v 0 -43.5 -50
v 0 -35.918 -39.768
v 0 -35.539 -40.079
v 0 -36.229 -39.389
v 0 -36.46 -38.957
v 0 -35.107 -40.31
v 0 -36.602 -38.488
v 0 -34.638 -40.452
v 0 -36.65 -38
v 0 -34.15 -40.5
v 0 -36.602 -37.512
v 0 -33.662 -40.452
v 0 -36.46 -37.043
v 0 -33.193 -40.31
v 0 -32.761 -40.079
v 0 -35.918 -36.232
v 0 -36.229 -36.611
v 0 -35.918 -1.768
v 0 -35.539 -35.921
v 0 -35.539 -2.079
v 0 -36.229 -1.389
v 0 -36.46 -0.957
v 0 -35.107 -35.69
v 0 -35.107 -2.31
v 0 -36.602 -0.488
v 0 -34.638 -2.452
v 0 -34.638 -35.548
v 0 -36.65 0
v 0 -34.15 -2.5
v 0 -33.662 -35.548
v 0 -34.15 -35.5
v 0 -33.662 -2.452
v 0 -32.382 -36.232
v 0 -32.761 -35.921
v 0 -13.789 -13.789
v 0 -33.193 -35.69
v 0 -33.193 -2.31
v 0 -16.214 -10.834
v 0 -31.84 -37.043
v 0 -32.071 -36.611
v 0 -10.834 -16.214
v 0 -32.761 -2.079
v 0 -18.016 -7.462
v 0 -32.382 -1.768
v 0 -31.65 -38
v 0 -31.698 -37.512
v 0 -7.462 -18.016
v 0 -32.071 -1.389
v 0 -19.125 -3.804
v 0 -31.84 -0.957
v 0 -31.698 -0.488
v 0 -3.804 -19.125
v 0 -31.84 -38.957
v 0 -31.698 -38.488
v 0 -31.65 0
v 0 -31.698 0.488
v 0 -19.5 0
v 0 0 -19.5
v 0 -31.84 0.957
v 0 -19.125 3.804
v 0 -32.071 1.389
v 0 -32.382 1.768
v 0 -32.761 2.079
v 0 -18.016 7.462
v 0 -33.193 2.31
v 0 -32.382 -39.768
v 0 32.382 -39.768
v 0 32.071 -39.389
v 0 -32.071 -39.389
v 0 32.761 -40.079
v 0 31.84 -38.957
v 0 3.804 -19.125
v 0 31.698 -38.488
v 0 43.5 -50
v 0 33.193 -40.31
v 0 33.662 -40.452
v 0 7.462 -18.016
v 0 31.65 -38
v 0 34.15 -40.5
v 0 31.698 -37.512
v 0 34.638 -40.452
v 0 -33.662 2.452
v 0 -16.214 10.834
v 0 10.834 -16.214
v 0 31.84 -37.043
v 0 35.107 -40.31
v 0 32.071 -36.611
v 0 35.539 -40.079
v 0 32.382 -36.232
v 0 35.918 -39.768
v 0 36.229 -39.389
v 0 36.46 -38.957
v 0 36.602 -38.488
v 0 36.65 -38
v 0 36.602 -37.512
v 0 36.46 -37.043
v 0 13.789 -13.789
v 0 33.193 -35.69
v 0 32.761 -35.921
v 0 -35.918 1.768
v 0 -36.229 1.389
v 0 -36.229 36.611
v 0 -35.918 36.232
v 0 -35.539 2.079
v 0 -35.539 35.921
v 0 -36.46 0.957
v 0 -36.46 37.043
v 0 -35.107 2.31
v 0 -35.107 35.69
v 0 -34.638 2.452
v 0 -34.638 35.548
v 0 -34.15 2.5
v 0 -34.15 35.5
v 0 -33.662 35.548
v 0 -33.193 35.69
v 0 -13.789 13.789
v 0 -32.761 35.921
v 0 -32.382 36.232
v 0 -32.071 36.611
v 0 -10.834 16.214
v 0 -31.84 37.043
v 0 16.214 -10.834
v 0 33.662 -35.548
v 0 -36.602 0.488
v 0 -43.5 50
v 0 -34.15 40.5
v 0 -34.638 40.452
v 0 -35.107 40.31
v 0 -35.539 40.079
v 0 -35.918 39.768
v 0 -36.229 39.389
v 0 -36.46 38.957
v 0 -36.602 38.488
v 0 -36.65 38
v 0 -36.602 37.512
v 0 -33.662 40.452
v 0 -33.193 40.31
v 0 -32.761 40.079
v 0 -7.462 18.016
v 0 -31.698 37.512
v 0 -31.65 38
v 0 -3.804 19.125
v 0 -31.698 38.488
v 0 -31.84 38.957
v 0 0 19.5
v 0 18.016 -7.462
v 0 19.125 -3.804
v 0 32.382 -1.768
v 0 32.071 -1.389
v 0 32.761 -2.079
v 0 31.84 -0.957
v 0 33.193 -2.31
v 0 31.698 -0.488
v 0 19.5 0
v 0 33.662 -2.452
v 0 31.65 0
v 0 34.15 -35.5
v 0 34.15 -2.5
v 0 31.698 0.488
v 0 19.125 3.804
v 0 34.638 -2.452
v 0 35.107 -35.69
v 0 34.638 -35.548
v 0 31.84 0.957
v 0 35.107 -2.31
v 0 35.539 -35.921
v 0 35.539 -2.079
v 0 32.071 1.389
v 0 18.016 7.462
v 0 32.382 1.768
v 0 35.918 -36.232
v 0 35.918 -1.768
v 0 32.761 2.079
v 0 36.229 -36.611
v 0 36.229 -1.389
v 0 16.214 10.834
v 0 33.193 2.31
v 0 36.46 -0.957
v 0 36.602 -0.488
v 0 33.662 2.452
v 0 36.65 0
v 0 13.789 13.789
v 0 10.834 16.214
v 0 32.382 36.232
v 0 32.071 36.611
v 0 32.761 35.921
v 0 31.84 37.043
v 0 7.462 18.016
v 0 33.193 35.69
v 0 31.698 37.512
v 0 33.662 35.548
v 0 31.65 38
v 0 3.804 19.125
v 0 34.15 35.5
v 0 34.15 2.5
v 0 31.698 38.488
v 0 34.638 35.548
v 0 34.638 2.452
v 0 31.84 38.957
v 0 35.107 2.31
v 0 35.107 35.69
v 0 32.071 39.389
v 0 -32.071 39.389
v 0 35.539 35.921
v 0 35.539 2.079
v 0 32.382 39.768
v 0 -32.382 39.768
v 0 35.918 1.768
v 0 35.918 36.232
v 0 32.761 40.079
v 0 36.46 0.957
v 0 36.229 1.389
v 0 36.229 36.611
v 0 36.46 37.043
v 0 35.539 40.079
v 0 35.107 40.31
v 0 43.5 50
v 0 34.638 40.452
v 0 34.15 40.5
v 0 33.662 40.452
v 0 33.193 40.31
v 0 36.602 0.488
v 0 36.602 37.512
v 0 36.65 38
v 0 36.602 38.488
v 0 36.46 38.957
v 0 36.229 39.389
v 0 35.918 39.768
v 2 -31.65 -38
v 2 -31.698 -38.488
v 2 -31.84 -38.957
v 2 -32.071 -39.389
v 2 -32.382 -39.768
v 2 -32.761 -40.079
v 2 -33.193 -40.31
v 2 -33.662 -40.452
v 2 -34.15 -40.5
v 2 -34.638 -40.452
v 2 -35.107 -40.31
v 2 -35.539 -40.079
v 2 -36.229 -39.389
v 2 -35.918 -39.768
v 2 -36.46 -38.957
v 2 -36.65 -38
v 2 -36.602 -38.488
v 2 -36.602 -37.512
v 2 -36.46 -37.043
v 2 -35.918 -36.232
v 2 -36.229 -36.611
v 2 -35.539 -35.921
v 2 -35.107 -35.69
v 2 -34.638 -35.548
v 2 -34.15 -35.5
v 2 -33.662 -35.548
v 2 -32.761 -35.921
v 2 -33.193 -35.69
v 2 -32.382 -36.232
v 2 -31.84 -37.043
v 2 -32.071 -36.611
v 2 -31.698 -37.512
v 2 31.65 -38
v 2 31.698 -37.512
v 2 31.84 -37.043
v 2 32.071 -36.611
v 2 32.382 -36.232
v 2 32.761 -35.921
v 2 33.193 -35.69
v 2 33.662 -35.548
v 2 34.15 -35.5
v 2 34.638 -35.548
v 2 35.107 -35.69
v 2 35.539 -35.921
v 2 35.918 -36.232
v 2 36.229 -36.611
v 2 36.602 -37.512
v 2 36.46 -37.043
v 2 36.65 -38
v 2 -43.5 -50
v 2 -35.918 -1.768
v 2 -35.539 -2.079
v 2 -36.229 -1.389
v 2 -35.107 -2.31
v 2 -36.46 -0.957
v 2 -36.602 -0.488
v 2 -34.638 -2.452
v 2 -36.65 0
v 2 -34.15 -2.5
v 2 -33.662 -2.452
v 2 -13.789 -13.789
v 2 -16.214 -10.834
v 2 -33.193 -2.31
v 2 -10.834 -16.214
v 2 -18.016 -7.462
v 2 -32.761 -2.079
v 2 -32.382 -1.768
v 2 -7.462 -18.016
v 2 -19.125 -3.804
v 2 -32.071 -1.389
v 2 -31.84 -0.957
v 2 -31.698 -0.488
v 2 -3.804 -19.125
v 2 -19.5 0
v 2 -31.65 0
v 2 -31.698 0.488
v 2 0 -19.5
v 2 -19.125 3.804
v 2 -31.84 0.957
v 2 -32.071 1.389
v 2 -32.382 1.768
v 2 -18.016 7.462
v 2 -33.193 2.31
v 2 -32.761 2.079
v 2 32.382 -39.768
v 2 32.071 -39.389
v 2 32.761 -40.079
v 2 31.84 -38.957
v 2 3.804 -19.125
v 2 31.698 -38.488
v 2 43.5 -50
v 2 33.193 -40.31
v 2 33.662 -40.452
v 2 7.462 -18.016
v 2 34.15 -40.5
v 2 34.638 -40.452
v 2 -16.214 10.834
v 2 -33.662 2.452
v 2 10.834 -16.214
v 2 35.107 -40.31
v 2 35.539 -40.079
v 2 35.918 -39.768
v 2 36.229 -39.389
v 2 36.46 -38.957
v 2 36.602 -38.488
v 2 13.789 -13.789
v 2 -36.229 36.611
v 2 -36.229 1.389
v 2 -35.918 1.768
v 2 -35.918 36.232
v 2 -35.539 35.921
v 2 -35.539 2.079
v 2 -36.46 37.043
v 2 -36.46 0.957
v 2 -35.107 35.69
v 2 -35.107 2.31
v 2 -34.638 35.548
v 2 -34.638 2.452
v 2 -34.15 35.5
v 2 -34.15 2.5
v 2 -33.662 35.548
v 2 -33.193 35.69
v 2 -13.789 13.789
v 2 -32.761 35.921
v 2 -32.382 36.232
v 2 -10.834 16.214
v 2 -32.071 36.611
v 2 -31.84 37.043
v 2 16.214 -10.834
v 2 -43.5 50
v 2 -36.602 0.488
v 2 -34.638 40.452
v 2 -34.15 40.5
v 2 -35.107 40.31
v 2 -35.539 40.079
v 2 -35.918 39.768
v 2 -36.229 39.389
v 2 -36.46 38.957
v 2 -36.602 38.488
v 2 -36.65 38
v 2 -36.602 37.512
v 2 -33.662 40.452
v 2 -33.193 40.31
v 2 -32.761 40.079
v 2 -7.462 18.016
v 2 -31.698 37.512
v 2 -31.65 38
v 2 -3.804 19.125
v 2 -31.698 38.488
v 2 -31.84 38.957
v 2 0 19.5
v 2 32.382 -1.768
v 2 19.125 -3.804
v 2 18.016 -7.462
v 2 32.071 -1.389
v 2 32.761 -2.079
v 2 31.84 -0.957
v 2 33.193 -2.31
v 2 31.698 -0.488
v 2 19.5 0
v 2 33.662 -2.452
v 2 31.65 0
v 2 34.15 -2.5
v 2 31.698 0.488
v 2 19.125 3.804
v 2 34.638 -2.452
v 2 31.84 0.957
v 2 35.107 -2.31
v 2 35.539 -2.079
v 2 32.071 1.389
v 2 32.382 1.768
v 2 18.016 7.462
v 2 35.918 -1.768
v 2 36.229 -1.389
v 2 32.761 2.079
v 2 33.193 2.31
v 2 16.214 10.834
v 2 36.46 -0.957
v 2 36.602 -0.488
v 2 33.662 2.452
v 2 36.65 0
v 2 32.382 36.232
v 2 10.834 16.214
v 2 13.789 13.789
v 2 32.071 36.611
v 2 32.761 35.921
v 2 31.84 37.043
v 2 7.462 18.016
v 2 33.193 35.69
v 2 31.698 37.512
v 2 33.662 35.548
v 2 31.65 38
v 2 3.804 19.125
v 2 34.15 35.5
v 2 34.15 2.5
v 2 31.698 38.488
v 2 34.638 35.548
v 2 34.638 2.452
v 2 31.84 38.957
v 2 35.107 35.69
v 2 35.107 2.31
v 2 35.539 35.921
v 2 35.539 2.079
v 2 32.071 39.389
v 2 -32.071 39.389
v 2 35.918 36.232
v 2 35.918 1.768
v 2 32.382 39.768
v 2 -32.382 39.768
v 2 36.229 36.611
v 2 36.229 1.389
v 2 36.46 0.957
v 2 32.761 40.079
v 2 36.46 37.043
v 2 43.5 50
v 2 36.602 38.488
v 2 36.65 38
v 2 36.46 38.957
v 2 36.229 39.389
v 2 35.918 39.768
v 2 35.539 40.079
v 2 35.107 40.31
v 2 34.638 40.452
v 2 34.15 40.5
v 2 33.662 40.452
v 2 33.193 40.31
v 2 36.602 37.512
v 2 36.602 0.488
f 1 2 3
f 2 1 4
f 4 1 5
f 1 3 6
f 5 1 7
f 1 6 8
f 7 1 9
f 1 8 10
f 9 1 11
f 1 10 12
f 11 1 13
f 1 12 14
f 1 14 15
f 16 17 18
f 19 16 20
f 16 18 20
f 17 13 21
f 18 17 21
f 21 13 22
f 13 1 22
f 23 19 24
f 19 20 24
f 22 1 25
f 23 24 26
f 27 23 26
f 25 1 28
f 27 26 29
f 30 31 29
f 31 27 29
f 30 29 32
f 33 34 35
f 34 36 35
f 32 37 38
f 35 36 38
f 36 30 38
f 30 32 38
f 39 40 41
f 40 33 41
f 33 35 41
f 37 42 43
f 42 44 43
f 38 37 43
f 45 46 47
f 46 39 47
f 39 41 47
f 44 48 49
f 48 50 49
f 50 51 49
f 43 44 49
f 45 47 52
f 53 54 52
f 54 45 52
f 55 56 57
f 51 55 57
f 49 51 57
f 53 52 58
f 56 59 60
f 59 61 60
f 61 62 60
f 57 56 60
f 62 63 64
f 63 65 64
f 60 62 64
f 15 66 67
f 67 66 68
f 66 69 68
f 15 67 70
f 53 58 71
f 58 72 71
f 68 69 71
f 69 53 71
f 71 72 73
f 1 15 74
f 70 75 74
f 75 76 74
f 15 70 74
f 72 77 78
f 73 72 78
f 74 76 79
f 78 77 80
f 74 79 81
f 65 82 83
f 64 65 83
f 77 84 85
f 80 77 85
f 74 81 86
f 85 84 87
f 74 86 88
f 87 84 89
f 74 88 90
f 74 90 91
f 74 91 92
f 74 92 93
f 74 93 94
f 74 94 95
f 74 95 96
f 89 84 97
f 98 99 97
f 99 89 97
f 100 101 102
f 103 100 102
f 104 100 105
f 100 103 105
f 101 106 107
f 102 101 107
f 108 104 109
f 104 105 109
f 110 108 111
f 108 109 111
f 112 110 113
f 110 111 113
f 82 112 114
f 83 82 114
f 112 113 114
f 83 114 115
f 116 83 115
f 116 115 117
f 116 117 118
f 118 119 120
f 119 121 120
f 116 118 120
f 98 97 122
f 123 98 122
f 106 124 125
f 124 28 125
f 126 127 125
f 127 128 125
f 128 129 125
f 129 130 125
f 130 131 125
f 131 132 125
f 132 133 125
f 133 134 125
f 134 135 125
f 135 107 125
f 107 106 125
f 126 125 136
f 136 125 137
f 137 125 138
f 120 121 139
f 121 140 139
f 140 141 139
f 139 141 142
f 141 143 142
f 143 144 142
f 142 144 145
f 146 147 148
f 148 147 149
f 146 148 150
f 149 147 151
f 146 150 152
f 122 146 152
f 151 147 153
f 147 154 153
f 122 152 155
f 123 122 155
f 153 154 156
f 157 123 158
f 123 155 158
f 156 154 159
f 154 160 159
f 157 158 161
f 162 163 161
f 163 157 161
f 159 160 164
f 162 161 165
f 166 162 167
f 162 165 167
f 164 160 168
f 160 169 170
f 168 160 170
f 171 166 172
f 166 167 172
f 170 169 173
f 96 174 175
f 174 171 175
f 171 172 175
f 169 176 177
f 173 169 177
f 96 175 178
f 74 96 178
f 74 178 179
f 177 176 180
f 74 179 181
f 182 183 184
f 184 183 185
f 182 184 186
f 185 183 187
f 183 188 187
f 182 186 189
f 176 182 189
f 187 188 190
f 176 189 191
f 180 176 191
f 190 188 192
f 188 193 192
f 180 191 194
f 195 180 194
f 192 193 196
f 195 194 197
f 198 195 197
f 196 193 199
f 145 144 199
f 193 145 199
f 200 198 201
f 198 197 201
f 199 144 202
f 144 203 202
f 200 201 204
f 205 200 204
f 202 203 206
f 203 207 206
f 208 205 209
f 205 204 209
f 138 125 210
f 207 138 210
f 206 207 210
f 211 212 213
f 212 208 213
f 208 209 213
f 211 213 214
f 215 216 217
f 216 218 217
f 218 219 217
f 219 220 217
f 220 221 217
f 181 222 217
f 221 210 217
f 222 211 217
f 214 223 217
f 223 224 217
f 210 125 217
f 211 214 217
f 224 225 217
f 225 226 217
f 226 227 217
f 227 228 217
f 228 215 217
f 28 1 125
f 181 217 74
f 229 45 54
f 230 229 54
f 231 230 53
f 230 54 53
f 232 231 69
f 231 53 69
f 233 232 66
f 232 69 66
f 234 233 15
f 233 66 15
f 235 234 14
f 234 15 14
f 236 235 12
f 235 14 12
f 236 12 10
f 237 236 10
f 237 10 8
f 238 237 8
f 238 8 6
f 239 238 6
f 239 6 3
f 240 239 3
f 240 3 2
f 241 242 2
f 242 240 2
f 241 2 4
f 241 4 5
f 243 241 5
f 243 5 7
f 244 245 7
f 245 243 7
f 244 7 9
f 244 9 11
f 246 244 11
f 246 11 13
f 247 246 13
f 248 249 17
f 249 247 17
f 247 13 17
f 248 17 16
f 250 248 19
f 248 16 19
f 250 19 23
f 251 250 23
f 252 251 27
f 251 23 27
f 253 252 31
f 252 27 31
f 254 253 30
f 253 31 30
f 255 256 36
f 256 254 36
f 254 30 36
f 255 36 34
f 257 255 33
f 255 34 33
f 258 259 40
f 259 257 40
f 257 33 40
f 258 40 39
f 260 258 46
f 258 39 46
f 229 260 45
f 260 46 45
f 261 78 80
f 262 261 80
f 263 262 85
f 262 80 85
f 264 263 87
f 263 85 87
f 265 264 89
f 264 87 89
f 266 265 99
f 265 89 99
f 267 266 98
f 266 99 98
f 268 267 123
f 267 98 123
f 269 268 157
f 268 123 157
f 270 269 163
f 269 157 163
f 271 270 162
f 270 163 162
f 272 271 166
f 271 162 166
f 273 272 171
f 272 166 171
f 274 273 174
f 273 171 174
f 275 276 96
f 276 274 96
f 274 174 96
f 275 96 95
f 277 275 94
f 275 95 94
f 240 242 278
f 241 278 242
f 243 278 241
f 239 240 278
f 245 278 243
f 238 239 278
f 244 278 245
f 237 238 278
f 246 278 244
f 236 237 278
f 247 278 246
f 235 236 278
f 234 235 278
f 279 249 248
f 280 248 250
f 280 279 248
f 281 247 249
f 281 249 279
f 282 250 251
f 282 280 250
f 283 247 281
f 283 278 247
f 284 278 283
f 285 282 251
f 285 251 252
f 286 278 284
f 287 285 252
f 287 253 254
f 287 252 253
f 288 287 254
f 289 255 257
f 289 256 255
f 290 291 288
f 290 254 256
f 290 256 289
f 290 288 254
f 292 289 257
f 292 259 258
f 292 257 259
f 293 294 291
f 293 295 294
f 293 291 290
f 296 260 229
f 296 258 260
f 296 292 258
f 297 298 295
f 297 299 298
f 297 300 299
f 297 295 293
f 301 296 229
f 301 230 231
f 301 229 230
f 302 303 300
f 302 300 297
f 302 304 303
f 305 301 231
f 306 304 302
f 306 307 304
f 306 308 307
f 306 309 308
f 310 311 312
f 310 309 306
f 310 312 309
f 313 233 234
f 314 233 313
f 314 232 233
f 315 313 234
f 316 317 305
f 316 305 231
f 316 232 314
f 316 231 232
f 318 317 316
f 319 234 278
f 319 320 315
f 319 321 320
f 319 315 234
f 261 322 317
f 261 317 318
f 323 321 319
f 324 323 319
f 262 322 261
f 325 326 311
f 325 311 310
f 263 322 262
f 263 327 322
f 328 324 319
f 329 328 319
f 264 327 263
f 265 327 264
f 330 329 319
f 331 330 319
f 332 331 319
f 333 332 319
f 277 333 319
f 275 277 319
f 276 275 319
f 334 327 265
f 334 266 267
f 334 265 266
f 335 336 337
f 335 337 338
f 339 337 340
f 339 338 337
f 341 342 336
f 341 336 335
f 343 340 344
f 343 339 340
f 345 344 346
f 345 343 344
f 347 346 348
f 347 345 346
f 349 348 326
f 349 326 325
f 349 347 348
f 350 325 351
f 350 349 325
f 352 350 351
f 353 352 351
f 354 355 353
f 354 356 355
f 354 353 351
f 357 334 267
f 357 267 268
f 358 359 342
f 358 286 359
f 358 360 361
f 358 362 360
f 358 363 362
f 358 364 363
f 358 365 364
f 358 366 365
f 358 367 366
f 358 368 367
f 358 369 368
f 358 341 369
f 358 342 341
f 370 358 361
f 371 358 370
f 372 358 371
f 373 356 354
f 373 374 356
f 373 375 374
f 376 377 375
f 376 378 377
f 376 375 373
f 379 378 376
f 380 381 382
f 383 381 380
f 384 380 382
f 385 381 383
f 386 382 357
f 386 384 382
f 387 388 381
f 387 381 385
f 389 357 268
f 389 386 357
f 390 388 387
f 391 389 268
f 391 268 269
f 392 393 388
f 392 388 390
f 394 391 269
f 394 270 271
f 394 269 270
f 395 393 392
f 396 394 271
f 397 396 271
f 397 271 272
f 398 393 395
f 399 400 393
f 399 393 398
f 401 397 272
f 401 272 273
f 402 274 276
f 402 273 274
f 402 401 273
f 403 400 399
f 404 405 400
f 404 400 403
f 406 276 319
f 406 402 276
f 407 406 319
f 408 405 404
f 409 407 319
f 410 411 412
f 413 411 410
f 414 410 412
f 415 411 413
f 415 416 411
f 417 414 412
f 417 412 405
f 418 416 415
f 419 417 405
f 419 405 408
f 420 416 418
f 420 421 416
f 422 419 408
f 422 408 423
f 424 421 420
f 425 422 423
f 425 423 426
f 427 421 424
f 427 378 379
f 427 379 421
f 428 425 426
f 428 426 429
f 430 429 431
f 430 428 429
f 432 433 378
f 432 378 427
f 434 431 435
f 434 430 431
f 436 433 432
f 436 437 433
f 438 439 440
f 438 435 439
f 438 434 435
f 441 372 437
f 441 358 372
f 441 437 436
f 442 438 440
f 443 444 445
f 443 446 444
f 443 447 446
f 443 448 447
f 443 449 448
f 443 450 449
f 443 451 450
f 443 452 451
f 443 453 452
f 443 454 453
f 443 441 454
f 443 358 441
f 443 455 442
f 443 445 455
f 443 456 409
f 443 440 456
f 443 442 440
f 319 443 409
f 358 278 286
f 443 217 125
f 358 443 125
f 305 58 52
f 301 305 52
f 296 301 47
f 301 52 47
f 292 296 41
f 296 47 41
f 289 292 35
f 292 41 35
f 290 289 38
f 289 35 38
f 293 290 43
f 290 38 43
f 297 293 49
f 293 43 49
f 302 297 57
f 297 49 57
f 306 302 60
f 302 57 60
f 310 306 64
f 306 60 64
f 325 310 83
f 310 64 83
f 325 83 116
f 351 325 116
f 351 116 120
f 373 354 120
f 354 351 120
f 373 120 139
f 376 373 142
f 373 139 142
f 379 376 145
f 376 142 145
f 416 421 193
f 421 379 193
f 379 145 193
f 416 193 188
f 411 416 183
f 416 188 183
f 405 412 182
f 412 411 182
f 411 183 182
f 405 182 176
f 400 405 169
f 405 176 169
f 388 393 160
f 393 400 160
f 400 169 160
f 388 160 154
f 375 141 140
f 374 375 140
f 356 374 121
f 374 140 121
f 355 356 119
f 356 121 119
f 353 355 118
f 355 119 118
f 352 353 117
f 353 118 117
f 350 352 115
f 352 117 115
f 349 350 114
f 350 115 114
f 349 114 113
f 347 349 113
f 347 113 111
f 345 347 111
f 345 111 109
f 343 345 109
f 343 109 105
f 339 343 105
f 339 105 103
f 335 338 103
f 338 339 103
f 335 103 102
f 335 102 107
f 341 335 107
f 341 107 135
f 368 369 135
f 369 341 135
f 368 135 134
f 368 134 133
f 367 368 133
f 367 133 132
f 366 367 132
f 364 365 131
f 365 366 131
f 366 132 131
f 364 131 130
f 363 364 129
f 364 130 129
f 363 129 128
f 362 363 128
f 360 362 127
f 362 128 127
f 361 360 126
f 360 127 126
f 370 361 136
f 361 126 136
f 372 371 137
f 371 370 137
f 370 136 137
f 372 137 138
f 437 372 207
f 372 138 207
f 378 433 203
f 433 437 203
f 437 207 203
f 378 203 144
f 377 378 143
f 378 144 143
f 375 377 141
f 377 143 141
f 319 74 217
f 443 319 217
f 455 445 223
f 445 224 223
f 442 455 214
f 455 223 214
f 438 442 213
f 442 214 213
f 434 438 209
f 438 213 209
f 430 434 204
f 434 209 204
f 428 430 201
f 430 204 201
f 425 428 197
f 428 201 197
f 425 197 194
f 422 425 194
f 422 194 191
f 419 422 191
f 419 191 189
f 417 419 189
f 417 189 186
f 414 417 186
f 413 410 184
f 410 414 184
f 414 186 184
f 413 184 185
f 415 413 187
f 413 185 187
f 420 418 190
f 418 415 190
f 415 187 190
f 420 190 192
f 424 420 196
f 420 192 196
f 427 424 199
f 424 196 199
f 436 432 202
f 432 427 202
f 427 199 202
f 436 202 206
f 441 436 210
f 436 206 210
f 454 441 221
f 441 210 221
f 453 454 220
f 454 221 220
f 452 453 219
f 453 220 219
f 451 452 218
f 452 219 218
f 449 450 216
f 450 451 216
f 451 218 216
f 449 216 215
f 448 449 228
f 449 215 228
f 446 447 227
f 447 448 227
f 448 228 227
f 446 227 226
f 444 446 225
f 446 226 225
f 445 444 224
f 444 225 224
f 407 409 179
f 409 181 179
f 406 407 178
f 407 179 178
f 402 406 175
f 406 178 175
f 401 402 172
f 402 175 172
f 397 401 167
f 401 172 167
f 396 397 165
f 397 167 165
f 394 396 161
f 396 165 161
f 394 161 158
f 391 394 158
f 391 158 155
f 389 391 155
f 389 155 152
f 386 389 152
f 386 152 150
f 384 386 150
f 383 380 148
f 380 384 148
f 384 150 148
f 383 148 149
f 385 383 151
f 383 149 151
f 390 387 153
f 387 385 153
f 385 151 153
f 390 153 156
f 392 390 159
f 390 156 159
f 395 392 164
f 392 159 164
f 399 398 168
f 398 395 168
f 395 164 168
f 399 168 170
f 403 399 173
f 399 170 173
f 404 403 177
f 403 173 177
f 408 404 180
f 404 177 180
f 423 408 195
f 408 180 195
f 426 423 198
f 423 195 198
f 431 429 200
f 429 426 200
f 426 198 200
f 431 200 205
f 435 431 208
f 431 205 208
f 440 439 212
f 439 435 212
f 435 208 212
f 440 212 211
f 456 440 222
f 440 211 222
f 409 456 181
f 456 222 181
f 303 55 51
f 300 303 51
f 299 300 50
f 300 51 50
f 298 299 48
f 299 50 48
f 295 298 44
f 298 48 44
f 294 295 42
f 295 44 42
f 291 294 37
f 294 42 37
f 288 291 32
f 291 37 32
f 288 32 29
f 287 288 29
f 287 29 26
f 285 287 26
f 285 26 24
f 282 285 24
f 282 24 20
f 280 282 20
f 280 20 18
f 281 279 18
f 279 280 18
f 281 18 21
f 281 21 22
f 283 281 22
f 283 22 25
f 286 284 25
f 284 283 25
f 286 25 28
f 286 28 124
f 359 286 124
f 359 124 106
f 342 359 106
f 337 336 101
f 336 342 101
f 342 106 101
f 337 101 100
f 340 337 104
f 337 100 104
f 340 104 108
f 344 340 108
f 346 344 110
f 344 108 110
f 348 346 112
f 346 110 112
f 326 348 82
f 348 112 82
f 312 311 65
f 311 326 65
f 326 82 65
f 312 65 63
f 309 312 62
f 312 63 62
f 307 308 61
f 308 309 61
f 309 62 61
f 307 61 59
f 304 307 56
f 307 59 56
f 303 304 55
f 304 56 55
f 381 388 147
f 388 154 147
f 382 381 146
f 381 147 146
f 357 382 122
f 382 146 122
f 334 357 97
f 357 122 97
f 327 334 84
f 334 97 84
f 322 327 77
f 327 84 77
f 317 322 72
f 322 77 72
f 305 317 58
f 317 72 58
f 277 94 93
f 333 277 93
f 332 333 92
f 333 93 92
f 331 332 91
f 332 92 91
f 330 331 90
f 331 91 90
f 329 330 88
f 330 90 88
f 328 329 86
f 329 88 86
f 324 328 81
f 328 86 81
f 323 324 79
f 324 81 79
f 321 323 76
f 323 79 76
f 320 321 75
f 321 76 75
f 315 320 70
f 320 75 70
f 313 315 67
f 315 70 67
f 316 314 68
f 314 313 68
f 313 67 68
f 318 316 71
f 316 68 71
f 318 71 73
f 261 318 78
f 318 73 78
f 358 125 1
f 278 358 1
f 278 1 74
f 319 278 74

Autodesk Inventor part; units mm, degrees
ref_plane "YZ Plane" through (0, 0, 0) normal (1, 0, 0) x (0, 1, 0)
ref_plane "XZ Plane" through (0, 0, 0) normal (0, 1, 0) x (-1, 0, 0)
ref_plane "XY Plane" through (0, 0, 0) normal (0, 0, 1) x (1, 0, 0)
sketch "Sketch1" plane through (0, 0, 0) normal (1, 0, 0) x (0, 1, 0)
  circle A0 centre (0, 0) radius 19.5
  line L0 (43.5, 50) -> (-43.5, 50)
  line L1 (-43.5, 50) -> (-43.5, -50)
  line L2 (-43.5, -50) -> (43.5, -50)
  line L3 (43.5, -50) -> (43.5, 50)
  line L4 (43.5, 50) -> (-43.5, -50) construction
  line L5 (-43.5, 50) -> (43.5, -50) construction
  line L6 (0, 0) -> (0, -38)
  line L7 (0, -38) -> (34.15, -38)
  circle A1 centre (34.15, -38) radius 2.5
  circle A2 centre (-34.15, -38) radius 2.5
  circle A3 centre (34.15, 0) radius 2.5
  circle A4 centre (-34.15, 0) radius 2.5
  circle A5 centre (34.15, 38) radius 2.5
  circle A6 centre (-34.15, 38) radius 2.5
  dimension "d0" = 39
  dimension "d1" = 87
  dimension "d2" = 100
  dimension "d3" = 38
  dimension "d4" = 34.15
  dimension "d5" = 5
  dimension "d8" = 68.3
  dimension "d11" = 38
extrude "Extrusion1" add sketch "Sketch1" along normal blind 2
properties part number "mount_plate_4x2020" material "Aluminum 6061"
